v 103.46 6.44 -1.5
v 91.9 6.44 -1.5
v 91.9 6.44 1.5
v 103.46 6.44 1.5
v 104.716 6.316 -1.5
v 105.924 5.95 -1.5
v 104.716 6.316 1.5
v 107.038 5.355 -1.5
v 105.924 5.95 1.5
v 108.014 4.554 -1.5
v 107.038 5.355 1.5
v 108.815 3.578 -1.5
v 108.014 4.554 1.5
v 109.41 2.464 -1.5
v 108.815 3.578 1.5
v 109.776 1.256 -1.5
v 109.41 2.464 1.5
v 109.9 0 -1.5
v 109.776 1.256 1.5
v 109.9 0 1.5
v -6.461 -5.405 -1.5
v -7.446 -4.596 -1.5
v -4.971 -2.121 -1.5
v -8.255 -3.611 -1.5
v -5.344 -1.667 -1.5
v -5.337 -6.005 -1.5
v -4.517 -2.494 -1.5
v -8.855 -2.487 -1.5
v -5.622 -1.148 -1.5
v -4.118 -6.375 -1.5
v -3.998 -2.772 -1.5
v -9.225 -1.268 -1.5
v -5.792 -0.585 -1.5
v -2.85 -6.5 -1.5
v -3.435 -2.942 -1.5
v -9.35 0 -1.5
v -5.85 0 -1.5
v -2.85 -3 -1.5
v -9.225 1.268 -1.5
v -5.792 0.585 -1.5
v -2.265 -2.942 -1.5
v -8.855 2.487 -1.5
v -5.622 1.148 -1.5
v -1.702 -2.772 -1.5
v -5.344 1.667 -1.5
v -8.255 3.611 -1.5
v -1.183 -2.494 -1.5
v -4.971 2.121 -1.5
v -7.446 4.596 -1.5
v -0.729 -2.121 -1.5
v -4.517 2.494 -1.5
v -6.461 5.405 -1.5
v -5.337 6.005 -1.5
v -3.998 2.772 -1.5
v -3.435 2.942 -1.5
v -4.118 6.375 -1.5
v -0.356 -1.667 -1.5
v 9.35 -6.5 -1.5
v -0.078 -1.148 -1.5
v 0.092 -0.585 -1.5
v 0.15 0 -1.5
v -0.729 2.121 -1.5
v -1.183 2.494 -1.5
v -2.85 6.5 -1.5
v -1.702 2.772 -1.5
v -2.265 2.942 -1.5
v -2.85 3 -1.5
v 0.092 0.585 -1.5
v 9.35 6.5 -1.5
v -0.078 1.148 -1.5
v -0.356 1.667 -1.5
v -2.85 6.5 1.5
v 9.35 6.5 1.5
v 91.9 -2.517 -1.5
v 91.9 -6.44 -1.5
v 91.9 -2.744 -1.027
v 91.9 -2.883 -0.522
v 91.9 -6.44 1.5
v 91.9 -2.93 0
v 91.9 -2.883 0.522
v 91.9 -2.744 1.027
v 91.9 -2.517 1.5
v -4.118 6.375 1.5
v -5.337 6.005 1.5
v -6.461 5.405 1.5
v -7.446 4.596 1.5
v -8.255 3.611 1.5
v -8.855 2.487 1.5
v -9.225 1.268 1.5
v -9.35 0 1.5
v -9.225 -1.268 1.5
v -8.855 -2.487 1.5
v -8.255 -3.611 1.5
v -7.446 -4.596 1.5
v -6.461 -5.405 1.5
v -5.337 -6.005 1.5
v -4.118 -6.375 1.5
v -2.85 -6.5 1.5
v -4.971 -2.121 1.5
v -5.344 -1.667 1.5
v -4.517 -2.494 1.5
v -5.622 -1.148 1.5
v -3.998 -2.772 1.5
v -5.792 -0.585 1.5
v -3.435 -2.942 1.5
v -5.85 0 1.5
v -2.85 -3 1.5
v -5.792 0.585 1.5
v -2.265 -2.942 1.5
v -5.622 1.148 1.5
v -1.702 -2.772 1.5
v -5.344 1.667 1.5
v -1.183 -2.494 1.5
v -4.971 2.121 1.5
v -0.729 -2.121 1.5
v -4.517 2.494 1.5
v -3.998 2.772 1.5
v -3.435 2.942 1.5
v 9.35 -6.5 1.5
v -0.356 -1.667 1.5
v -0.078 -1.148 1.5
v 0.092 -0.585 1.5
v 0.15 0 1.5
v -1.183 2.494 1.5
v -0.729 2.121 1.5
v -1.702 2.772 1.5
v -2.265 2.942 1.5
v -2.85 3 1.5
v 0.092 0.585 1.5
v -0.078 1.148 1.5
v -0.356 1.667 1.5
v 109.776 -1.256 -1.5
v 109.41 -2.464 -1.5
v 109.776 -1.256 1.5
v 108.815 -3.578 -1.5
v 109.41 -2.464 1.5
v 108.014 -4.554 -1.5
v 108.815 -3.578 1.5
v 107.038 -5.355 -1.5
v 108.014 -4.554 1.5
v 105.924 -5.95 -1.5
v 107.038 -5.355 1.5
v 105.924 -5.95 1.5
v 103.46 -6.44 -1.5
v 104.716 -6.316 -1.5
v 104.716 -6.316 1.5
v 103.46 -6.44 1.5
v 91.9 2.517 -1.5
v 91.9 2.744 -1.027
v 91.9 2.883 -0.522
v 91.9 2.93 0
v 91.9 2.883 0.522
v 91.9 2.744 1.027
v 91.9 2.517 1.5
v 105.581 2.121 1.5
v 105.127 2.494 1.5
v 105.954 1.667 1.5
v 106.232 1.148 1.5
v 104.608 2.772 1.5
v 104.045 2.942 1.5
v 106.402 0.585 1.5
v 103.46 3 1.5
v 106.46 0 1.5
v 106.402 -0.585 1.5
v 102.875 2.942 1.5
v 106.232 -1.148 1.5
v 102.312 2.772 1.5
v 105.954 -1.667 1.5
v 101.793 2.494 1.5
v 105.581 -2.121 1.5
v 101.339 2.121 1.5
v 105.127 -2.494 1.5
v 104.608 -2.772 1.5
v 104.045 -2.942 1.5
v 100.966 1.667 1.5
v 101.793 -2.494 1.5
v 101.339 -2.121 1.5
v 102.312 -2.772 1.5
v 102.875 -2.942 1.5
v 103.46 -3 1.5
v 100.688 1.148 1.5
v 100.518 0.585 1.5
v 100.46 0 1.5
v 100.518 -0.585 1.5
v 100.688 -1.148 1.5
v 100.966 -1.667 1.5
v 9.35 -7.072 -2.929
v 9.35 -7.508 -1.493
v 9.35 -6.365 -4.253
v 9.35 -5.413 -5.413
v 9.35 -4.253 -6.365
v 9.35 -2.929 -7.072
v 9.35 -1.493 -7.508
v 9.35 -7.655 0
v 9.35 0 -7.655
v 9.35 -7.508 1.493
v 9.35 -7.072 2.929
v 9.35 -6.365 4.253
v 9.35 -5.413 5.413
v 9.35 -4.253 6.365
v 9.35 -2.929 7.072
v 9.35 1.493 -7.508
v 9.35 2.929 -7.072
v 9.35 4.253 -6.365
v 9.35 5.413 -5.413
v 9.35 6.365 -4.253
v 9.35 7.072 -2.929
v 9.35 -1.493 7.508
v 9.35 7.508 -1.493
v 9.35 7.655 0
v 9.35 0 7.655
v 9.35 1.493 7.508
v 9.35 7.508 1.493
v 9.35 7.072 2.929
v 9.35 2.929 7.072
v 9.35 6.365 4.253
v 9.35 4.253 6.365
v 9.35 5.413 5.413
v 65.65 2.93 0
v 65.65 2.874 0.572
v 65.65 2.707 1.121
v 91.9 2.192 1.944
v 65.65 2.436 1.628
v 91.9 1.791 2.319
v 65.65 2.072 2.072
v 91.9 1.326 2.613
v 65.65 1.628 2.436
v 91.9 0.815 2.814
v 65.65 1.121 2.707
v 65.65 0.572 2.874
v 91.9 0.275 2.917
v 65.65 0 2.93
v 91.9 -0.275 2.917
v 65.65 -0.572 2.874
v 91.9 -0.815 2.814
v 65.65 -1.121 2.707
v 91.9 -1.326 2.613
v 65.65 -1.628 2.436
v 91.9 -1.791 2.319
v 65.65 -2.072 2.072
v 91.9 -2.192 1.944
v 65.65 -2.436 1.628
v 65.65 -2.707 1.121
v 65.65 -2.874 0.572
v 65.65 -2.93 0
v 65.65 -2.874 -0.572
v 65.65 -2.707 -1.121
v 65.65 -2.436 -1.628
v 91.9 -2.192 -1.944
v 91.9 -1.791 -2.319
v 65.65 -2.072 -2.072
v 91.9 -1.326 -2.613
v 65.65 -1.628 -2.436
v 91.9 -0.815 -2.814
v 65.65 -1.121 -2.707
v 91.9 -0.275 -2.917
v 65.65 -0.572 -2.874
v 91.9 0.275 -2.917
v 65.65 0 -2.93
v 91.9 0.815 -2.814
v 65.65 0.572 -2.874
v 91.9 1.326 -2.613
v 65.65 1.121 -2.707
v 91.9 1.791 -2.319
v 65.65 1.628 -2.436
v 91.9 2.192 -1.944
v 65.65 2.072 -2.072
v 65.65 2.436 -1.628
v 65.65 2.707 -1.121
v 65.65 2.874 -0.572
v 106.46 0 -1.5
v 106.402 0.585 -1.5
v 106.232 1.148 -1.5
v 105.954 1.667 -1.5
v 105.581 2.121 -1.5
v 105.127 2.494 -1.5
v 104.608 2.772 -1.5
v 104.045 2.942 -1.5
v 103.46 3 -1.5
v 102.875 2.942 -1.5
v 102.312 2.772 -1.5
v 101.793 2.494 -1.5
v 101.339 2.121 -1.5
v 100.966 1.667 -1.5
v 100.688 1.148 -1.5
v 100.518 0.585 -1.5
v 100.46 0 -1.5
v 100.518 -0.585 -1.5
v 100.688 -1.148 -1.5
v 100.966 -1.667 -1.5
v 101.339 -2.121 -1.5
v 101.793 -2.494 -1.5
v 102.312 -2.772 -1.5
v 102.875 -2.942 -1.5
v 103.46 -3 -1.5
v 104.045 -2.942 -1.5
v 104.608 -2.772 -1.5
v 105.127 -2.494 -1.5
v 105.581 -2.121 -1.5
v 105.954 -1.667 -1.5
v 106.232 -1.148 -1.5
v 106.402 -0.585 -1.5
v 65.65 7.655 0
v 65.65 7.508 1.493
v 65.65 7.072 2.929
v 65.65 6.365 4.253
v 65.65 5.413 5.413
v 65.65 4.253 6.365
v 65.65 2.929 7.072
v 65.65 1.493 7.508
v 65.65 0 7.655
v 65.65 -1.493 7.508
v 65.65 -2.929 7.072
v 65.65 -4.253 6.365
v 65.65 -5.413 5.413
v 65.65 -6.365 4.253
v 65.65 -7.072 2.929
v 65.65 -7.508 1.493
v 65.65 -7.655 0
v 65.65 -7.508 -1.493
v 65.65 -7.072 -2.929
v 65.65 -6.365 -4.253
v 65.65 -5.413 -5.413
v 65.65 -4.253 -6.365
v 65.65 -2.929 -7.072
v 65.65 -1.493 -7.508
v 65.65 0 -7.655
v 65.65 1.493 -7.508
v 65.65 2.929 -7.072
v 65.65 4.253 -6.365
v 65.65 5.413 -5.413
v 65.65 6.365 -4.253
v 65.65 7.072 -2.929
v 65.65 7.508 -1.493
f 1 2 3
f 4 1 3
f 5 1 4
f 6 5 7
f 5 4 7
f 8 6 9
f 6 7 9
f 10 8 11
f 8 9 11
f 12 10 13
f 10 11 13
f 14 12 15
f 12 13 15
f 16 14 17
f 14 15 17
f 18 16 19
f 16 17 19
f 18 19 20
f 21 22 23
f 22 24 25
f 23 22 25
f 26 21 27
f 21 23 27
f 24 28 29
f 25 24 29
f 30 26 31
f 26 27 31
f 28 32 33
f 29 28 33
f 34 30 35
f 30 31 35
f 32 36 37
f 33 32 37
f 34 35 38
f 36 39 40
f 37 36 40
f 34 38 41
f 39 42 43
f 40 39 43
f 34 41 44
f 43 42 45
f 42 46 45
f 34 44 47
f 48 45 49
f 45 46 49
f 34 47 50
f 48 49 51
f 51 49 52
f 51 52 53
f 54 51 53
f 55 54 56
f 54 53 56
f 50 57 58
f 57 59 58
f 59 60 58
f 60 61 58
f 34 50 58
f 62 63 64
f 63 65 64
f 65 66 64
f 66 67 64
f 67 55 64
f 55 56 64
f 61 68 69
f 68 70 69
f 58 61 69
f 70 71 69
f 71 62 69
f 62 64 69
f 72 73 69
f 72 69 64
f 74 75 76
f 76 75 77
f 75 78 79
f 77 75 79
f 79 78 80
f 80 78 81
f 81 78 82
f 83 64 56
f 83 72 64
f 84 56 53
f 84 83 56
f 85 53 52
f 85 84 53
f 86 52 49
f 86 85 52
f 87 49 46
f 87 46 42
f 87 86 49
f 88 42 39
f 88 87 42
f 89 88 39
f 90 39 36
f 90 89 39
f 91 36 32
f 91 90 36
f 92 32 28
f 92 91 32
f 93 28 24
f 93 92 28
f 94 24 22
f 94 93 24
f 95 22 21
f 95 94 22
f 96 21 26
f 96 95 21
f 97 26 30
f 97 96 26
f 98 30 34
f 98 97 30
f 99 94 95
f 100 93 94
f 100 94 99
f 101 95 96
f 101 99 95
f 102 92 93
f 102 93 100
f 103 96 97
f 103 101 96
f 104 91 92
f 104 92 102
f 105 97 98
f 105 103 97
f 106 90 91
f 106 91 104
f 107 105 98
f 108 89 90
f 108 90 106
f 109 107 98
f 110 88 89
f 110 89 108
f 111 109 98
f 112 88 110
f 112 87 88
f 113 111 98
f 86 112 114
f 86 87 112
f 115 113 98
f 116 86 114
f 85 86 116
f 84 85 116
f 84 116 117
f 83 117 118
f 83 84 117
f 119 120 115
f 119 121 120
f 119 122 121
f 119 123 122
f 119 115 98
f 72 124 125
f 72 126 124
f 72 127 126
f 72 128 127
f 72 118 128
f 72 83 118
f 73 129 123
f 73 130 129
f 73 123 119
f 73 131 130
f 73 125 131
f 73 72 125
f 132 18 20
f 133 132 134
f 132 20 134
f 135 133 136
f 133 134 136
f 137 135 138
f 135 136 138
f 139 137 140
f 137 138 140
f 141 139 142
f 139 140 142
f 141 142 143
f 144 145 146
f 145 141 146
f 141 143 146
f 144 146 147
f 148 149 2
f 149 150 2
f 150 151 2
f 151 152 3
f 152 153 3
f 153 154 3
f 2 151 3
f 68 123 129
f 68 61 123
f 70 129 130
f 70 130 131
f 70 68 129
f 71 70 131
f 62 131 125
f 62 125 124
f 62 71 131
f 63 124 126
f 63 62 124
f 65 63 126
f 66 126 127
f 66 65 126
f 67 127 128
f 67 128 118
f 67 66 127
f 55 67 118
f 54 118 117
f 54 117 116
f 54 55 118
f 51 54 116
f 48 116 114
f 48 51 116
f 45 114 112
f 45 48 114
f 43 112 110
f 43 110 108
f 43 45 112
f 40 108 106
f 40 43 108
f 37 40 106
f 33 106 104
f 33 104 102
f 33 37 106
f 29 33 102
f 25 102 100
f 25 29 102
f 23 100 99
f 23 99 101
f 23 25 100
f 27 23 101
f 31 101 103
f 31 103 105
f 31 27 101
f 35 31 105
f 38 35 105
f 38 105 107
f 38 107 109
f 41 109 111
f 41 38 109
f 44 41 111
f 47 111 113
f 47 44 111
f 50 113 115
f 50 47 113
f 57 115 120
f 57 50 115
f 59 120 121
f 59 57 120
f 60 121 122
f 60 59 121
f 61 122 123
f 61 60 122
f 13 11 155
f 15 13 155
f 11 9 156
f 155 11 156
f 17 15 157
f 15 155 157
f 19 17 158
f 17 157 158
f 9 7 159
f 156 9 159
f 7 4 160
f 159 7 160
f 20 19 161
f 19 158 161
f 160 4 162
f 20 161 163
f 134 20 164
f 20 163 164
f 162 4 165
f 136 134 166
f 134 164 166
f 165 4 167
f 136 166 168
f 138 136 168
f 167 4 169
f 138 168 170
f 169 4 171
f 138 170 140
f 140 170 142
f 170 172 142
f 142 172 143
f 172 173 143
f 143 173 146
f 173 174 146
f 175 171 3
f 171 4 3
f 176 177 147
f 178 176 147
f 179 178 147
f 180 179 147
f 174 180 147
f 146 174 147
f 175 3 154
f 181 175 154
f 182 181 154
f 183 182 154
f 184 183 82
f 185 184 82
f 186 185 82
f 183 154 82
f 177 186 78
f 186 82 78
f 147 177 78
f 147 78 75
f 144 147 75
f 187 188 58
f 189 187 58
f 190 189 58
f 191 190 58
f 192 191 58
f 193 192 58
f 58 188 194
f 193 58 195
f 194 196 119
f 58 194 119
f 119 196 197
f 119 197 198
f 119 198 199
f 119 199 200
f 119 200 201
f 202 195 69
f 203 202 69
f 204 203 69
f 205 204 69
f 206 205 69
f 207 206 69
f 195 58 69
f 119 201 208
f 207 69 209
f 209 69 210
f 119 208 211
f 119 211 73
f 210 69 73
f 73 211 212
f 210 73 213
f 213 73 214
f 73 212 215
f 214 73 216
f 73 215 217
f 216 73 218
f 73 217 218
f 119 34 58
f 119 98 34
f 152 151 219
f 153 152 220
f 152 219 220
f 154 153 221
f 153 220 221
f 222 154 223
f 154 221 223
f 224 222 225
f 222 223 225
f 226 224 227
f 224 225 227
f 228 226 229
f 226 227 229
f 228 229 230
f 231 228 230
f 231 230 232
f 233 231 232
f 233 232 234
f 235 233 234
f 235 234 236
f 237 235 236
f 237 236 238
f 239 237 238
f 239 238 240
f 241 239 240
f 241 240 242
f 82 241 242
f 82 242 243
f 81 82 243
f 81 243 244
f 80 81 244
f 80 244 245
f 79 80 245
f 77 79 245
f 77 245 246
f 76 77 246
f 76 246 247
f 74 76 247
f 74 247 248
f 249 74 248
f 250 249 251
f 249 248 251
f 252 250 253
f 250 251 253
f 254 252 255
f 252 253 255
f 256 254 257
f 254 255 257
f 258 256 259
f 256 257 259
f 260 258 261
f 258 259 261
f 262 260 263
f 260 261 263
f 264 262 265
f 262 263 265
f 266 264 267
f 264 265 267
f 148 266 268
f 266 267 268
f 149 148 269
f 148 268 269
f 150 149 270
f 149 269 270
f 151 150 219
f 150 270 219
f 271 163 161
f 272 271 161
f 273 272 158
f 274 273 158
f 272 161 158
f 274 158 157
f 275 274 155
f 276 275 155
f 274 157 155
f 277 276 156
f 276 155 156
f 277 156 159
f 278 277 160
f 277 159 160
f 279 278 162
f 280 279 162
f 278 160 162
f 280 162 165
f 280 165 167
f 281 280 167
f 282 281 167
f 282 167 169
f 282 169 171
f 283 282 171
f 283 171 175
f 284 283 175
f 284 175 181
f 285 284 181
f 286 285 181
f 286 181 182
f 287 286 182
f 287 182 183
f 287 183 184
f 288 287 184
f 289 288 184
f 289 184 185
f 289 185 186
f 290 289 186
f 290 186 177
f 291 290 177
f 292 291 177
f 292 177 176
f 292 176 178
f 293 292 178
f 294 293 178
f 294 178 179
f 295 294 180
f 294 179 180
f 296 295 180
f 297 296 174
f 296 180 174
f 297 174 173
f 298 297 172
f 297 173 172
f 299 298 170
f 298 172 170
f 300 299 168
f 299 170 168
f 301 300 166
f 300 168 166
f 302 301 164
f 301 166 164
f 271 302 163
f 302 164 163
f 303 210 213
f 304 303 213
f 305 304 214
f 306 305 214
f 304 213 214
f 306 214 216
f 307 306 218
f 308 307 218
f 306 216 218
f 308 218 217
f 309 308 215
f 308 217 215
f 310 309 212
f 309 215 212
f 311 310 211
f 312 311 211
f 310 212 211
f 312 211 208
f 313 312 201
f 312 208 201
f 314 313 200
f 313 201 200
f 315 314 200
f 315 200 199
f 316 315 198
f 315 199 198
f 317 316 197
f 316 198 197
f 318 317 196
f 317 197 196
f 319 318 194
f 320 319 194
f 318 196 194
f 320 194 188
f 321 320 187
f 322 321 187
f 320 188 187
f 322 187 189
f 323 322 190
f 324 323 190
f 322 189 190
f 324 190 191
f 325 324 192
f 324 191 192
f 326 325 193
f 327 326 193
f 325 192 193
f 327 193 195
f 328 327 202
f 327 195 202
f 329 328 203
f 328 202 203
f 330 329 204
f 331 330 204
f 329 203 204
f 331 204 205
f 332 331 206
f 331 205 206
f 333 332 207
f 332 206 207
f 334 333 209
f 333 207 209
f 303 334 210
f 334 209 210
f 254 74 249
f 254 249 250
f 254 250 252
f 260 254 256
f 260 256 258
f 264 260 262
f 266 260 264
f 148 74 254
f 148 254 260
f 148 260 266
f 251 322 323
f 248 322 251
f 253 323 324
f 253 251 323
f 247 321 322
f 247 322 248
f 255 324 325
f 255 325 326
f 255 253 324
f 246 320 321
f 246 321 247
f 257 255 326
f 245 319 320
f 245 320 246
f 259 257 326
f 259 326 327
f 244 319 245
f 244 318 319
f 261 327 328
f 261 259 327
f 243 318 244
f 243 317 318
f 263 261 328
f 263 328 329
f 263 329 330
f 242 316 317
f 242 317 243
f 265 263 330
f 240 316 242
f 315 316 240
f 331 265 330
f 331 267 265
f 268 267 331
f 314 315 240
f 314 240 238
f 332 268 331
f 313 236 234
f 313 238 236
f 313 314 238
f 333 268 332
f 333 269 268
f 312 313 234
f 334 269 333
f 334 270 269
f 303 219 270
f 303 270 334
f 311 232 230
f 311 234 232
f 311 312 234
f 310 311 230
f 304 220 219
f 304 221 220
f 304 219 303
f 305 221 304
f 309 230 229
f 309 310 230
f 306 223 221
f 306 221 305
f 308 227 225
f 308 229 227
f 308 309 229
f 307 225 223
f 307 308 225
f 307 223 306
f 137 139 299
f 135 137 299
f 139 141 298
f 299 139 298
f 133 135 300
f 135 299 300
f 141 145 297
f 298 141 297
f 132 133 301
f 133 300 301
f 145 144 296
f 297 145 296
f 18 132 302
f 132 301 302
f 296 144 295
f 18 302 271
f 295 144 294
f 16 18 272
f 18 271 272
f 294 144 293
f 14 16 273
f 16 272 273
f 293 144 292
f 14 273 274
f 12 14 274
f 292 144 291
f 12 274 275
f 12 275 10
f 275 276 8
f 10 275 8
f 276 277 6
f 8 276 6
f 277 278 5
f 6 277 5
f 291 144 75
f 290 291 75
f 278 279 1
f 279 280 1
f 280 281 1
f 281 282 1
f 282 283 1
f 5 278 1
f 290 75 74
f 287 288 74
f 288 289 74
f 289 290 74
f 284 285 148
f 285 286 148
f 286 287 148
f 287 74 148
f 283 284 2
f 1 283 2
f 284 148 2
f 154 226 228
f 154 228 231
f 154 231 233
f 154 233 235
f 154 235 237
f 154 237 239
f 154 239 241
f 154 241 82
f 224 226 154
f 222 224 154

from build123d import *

# Parameters (mm, degrees)
F0_R     = 3
F1_DEPTH = 1.5
F2_R     = 7.655
F2_W     = 13
F2_H     = 3
F3_DEPTH = 56.3
F4_R     = 2.93
F5_DEPTH = 26.25
F7_DEPTH = 18
F8_R     = 3
F9_DEPTH = 9.156


with BuildPart() as f1:
    # F0 (on Top) → F1 (new body, symmetric)
    with BuildSketch(Plane.XY):
        with BuildLine():
            Line((-2.85, -6.5), (9.35, -6.5))
            Line((9.35, -6.5), (9.35, 6.5))
            Line((9.35, 6.5), (-2.85, 6.5))
            ThreePointArc((-2.85, 6.5), (-9.35, 0), (-2.85, -6.5))
        make_face()
        with Locations((-2.85, 0)):
            Circle(F0_R, mode=Mode.SUBTRACT)
    extrude(amount=F1_DEPTH, both=True)

    # F2 (on face) → F3 (join)
    with BuildSketch(Plane.YZ.offset(9.35)):
        Circle(F2_R)
        Rectangle(F2_W, F2_H, mode=Mode.SUBTRACT)
        Rectangle(F2_W, F2_H)
    extrude(amount=F3_DEPTH)

    # F4 (on face) → F5 (join)
    with BuildSketch(Plane.YZ.offset(65.65)):
        Circle(F4_R)
    extrude(amount=F5_DEPTH)

    # F6 (on face) → F7 (join)
    with BuildSketch(Plane.YZ.offset(91.9)):
        with BuildLine():
            Line((2.516923, -1.5), (6.44, -1.5))
            Line((6.44, -1.5), (6.44, 1.5))
            Line((6.44, 1.5), (2.516923, 1.5))
            ThreePointArc((2.516923, 1.5), (2.824844, 0.777919), (2.93, 0))
            ThreePointArc((2.93, 0), (2.824844, -0.777919), (2.516923, -1.5))
        make_face()
        with BuildLine():
            Line((-2.516923, -1.5), (2.516923, -1.5))
            ThreePointArc((2.516923, -1.5), (2.824844, -0.777919), (2.93, 0))
            ThreePointArc((2.93, 0), (2.824844, 0.777919), (2.516923, 1.5))
            Line((2.516923, 1.5), (-2.516923, 1.5))
            ThreePointArc((-2.516923, 1.5), (-2.93, 0), (-2.516923, -1.5))
        make_face()
        with BuildLine():
            Line((-6.44, -1.5), (-2.516923, -1.5))
            ThreePointArc((-2.516923, -1.5), (-2.93, 0), (-2.516923, 1.5))
            Line((-2.516923, 1.5), (-6.44, 1.5))
            Line((-6.44, 1.5), (-6.44, -1.5))
        make_face()
    extrude(amount=F7_DEPTH)

    # F8 (on face) → F9 (cut, through all)
    with BuildSketch(Plane.XY.offset(1.5)):
        with Locations((103.46, 0)):
            Circle(F8_R)
        with BuildLine():
            ThreePointArc((103.46, 6.44), (108.013768, 4.553768), (109.9, 0))
            Line((109.9, 0), (109.9, 6.44))
            Line((109.9, 6.44), (103.46, 6.44))
        make_face()
        with BuildLine():
            ThreePointArc((109.9, 0), (108.013768, -4.553768), (103.46, -6.44))
            Line((103.46, -6.44), (109.9, -6.44))
            Line((109.9, -6.44), (109.9, 0))
        make_face()
    extrude(amount=-F9_DEPTH, mode=Mode.SUBTRACT)


solid = f1.part
